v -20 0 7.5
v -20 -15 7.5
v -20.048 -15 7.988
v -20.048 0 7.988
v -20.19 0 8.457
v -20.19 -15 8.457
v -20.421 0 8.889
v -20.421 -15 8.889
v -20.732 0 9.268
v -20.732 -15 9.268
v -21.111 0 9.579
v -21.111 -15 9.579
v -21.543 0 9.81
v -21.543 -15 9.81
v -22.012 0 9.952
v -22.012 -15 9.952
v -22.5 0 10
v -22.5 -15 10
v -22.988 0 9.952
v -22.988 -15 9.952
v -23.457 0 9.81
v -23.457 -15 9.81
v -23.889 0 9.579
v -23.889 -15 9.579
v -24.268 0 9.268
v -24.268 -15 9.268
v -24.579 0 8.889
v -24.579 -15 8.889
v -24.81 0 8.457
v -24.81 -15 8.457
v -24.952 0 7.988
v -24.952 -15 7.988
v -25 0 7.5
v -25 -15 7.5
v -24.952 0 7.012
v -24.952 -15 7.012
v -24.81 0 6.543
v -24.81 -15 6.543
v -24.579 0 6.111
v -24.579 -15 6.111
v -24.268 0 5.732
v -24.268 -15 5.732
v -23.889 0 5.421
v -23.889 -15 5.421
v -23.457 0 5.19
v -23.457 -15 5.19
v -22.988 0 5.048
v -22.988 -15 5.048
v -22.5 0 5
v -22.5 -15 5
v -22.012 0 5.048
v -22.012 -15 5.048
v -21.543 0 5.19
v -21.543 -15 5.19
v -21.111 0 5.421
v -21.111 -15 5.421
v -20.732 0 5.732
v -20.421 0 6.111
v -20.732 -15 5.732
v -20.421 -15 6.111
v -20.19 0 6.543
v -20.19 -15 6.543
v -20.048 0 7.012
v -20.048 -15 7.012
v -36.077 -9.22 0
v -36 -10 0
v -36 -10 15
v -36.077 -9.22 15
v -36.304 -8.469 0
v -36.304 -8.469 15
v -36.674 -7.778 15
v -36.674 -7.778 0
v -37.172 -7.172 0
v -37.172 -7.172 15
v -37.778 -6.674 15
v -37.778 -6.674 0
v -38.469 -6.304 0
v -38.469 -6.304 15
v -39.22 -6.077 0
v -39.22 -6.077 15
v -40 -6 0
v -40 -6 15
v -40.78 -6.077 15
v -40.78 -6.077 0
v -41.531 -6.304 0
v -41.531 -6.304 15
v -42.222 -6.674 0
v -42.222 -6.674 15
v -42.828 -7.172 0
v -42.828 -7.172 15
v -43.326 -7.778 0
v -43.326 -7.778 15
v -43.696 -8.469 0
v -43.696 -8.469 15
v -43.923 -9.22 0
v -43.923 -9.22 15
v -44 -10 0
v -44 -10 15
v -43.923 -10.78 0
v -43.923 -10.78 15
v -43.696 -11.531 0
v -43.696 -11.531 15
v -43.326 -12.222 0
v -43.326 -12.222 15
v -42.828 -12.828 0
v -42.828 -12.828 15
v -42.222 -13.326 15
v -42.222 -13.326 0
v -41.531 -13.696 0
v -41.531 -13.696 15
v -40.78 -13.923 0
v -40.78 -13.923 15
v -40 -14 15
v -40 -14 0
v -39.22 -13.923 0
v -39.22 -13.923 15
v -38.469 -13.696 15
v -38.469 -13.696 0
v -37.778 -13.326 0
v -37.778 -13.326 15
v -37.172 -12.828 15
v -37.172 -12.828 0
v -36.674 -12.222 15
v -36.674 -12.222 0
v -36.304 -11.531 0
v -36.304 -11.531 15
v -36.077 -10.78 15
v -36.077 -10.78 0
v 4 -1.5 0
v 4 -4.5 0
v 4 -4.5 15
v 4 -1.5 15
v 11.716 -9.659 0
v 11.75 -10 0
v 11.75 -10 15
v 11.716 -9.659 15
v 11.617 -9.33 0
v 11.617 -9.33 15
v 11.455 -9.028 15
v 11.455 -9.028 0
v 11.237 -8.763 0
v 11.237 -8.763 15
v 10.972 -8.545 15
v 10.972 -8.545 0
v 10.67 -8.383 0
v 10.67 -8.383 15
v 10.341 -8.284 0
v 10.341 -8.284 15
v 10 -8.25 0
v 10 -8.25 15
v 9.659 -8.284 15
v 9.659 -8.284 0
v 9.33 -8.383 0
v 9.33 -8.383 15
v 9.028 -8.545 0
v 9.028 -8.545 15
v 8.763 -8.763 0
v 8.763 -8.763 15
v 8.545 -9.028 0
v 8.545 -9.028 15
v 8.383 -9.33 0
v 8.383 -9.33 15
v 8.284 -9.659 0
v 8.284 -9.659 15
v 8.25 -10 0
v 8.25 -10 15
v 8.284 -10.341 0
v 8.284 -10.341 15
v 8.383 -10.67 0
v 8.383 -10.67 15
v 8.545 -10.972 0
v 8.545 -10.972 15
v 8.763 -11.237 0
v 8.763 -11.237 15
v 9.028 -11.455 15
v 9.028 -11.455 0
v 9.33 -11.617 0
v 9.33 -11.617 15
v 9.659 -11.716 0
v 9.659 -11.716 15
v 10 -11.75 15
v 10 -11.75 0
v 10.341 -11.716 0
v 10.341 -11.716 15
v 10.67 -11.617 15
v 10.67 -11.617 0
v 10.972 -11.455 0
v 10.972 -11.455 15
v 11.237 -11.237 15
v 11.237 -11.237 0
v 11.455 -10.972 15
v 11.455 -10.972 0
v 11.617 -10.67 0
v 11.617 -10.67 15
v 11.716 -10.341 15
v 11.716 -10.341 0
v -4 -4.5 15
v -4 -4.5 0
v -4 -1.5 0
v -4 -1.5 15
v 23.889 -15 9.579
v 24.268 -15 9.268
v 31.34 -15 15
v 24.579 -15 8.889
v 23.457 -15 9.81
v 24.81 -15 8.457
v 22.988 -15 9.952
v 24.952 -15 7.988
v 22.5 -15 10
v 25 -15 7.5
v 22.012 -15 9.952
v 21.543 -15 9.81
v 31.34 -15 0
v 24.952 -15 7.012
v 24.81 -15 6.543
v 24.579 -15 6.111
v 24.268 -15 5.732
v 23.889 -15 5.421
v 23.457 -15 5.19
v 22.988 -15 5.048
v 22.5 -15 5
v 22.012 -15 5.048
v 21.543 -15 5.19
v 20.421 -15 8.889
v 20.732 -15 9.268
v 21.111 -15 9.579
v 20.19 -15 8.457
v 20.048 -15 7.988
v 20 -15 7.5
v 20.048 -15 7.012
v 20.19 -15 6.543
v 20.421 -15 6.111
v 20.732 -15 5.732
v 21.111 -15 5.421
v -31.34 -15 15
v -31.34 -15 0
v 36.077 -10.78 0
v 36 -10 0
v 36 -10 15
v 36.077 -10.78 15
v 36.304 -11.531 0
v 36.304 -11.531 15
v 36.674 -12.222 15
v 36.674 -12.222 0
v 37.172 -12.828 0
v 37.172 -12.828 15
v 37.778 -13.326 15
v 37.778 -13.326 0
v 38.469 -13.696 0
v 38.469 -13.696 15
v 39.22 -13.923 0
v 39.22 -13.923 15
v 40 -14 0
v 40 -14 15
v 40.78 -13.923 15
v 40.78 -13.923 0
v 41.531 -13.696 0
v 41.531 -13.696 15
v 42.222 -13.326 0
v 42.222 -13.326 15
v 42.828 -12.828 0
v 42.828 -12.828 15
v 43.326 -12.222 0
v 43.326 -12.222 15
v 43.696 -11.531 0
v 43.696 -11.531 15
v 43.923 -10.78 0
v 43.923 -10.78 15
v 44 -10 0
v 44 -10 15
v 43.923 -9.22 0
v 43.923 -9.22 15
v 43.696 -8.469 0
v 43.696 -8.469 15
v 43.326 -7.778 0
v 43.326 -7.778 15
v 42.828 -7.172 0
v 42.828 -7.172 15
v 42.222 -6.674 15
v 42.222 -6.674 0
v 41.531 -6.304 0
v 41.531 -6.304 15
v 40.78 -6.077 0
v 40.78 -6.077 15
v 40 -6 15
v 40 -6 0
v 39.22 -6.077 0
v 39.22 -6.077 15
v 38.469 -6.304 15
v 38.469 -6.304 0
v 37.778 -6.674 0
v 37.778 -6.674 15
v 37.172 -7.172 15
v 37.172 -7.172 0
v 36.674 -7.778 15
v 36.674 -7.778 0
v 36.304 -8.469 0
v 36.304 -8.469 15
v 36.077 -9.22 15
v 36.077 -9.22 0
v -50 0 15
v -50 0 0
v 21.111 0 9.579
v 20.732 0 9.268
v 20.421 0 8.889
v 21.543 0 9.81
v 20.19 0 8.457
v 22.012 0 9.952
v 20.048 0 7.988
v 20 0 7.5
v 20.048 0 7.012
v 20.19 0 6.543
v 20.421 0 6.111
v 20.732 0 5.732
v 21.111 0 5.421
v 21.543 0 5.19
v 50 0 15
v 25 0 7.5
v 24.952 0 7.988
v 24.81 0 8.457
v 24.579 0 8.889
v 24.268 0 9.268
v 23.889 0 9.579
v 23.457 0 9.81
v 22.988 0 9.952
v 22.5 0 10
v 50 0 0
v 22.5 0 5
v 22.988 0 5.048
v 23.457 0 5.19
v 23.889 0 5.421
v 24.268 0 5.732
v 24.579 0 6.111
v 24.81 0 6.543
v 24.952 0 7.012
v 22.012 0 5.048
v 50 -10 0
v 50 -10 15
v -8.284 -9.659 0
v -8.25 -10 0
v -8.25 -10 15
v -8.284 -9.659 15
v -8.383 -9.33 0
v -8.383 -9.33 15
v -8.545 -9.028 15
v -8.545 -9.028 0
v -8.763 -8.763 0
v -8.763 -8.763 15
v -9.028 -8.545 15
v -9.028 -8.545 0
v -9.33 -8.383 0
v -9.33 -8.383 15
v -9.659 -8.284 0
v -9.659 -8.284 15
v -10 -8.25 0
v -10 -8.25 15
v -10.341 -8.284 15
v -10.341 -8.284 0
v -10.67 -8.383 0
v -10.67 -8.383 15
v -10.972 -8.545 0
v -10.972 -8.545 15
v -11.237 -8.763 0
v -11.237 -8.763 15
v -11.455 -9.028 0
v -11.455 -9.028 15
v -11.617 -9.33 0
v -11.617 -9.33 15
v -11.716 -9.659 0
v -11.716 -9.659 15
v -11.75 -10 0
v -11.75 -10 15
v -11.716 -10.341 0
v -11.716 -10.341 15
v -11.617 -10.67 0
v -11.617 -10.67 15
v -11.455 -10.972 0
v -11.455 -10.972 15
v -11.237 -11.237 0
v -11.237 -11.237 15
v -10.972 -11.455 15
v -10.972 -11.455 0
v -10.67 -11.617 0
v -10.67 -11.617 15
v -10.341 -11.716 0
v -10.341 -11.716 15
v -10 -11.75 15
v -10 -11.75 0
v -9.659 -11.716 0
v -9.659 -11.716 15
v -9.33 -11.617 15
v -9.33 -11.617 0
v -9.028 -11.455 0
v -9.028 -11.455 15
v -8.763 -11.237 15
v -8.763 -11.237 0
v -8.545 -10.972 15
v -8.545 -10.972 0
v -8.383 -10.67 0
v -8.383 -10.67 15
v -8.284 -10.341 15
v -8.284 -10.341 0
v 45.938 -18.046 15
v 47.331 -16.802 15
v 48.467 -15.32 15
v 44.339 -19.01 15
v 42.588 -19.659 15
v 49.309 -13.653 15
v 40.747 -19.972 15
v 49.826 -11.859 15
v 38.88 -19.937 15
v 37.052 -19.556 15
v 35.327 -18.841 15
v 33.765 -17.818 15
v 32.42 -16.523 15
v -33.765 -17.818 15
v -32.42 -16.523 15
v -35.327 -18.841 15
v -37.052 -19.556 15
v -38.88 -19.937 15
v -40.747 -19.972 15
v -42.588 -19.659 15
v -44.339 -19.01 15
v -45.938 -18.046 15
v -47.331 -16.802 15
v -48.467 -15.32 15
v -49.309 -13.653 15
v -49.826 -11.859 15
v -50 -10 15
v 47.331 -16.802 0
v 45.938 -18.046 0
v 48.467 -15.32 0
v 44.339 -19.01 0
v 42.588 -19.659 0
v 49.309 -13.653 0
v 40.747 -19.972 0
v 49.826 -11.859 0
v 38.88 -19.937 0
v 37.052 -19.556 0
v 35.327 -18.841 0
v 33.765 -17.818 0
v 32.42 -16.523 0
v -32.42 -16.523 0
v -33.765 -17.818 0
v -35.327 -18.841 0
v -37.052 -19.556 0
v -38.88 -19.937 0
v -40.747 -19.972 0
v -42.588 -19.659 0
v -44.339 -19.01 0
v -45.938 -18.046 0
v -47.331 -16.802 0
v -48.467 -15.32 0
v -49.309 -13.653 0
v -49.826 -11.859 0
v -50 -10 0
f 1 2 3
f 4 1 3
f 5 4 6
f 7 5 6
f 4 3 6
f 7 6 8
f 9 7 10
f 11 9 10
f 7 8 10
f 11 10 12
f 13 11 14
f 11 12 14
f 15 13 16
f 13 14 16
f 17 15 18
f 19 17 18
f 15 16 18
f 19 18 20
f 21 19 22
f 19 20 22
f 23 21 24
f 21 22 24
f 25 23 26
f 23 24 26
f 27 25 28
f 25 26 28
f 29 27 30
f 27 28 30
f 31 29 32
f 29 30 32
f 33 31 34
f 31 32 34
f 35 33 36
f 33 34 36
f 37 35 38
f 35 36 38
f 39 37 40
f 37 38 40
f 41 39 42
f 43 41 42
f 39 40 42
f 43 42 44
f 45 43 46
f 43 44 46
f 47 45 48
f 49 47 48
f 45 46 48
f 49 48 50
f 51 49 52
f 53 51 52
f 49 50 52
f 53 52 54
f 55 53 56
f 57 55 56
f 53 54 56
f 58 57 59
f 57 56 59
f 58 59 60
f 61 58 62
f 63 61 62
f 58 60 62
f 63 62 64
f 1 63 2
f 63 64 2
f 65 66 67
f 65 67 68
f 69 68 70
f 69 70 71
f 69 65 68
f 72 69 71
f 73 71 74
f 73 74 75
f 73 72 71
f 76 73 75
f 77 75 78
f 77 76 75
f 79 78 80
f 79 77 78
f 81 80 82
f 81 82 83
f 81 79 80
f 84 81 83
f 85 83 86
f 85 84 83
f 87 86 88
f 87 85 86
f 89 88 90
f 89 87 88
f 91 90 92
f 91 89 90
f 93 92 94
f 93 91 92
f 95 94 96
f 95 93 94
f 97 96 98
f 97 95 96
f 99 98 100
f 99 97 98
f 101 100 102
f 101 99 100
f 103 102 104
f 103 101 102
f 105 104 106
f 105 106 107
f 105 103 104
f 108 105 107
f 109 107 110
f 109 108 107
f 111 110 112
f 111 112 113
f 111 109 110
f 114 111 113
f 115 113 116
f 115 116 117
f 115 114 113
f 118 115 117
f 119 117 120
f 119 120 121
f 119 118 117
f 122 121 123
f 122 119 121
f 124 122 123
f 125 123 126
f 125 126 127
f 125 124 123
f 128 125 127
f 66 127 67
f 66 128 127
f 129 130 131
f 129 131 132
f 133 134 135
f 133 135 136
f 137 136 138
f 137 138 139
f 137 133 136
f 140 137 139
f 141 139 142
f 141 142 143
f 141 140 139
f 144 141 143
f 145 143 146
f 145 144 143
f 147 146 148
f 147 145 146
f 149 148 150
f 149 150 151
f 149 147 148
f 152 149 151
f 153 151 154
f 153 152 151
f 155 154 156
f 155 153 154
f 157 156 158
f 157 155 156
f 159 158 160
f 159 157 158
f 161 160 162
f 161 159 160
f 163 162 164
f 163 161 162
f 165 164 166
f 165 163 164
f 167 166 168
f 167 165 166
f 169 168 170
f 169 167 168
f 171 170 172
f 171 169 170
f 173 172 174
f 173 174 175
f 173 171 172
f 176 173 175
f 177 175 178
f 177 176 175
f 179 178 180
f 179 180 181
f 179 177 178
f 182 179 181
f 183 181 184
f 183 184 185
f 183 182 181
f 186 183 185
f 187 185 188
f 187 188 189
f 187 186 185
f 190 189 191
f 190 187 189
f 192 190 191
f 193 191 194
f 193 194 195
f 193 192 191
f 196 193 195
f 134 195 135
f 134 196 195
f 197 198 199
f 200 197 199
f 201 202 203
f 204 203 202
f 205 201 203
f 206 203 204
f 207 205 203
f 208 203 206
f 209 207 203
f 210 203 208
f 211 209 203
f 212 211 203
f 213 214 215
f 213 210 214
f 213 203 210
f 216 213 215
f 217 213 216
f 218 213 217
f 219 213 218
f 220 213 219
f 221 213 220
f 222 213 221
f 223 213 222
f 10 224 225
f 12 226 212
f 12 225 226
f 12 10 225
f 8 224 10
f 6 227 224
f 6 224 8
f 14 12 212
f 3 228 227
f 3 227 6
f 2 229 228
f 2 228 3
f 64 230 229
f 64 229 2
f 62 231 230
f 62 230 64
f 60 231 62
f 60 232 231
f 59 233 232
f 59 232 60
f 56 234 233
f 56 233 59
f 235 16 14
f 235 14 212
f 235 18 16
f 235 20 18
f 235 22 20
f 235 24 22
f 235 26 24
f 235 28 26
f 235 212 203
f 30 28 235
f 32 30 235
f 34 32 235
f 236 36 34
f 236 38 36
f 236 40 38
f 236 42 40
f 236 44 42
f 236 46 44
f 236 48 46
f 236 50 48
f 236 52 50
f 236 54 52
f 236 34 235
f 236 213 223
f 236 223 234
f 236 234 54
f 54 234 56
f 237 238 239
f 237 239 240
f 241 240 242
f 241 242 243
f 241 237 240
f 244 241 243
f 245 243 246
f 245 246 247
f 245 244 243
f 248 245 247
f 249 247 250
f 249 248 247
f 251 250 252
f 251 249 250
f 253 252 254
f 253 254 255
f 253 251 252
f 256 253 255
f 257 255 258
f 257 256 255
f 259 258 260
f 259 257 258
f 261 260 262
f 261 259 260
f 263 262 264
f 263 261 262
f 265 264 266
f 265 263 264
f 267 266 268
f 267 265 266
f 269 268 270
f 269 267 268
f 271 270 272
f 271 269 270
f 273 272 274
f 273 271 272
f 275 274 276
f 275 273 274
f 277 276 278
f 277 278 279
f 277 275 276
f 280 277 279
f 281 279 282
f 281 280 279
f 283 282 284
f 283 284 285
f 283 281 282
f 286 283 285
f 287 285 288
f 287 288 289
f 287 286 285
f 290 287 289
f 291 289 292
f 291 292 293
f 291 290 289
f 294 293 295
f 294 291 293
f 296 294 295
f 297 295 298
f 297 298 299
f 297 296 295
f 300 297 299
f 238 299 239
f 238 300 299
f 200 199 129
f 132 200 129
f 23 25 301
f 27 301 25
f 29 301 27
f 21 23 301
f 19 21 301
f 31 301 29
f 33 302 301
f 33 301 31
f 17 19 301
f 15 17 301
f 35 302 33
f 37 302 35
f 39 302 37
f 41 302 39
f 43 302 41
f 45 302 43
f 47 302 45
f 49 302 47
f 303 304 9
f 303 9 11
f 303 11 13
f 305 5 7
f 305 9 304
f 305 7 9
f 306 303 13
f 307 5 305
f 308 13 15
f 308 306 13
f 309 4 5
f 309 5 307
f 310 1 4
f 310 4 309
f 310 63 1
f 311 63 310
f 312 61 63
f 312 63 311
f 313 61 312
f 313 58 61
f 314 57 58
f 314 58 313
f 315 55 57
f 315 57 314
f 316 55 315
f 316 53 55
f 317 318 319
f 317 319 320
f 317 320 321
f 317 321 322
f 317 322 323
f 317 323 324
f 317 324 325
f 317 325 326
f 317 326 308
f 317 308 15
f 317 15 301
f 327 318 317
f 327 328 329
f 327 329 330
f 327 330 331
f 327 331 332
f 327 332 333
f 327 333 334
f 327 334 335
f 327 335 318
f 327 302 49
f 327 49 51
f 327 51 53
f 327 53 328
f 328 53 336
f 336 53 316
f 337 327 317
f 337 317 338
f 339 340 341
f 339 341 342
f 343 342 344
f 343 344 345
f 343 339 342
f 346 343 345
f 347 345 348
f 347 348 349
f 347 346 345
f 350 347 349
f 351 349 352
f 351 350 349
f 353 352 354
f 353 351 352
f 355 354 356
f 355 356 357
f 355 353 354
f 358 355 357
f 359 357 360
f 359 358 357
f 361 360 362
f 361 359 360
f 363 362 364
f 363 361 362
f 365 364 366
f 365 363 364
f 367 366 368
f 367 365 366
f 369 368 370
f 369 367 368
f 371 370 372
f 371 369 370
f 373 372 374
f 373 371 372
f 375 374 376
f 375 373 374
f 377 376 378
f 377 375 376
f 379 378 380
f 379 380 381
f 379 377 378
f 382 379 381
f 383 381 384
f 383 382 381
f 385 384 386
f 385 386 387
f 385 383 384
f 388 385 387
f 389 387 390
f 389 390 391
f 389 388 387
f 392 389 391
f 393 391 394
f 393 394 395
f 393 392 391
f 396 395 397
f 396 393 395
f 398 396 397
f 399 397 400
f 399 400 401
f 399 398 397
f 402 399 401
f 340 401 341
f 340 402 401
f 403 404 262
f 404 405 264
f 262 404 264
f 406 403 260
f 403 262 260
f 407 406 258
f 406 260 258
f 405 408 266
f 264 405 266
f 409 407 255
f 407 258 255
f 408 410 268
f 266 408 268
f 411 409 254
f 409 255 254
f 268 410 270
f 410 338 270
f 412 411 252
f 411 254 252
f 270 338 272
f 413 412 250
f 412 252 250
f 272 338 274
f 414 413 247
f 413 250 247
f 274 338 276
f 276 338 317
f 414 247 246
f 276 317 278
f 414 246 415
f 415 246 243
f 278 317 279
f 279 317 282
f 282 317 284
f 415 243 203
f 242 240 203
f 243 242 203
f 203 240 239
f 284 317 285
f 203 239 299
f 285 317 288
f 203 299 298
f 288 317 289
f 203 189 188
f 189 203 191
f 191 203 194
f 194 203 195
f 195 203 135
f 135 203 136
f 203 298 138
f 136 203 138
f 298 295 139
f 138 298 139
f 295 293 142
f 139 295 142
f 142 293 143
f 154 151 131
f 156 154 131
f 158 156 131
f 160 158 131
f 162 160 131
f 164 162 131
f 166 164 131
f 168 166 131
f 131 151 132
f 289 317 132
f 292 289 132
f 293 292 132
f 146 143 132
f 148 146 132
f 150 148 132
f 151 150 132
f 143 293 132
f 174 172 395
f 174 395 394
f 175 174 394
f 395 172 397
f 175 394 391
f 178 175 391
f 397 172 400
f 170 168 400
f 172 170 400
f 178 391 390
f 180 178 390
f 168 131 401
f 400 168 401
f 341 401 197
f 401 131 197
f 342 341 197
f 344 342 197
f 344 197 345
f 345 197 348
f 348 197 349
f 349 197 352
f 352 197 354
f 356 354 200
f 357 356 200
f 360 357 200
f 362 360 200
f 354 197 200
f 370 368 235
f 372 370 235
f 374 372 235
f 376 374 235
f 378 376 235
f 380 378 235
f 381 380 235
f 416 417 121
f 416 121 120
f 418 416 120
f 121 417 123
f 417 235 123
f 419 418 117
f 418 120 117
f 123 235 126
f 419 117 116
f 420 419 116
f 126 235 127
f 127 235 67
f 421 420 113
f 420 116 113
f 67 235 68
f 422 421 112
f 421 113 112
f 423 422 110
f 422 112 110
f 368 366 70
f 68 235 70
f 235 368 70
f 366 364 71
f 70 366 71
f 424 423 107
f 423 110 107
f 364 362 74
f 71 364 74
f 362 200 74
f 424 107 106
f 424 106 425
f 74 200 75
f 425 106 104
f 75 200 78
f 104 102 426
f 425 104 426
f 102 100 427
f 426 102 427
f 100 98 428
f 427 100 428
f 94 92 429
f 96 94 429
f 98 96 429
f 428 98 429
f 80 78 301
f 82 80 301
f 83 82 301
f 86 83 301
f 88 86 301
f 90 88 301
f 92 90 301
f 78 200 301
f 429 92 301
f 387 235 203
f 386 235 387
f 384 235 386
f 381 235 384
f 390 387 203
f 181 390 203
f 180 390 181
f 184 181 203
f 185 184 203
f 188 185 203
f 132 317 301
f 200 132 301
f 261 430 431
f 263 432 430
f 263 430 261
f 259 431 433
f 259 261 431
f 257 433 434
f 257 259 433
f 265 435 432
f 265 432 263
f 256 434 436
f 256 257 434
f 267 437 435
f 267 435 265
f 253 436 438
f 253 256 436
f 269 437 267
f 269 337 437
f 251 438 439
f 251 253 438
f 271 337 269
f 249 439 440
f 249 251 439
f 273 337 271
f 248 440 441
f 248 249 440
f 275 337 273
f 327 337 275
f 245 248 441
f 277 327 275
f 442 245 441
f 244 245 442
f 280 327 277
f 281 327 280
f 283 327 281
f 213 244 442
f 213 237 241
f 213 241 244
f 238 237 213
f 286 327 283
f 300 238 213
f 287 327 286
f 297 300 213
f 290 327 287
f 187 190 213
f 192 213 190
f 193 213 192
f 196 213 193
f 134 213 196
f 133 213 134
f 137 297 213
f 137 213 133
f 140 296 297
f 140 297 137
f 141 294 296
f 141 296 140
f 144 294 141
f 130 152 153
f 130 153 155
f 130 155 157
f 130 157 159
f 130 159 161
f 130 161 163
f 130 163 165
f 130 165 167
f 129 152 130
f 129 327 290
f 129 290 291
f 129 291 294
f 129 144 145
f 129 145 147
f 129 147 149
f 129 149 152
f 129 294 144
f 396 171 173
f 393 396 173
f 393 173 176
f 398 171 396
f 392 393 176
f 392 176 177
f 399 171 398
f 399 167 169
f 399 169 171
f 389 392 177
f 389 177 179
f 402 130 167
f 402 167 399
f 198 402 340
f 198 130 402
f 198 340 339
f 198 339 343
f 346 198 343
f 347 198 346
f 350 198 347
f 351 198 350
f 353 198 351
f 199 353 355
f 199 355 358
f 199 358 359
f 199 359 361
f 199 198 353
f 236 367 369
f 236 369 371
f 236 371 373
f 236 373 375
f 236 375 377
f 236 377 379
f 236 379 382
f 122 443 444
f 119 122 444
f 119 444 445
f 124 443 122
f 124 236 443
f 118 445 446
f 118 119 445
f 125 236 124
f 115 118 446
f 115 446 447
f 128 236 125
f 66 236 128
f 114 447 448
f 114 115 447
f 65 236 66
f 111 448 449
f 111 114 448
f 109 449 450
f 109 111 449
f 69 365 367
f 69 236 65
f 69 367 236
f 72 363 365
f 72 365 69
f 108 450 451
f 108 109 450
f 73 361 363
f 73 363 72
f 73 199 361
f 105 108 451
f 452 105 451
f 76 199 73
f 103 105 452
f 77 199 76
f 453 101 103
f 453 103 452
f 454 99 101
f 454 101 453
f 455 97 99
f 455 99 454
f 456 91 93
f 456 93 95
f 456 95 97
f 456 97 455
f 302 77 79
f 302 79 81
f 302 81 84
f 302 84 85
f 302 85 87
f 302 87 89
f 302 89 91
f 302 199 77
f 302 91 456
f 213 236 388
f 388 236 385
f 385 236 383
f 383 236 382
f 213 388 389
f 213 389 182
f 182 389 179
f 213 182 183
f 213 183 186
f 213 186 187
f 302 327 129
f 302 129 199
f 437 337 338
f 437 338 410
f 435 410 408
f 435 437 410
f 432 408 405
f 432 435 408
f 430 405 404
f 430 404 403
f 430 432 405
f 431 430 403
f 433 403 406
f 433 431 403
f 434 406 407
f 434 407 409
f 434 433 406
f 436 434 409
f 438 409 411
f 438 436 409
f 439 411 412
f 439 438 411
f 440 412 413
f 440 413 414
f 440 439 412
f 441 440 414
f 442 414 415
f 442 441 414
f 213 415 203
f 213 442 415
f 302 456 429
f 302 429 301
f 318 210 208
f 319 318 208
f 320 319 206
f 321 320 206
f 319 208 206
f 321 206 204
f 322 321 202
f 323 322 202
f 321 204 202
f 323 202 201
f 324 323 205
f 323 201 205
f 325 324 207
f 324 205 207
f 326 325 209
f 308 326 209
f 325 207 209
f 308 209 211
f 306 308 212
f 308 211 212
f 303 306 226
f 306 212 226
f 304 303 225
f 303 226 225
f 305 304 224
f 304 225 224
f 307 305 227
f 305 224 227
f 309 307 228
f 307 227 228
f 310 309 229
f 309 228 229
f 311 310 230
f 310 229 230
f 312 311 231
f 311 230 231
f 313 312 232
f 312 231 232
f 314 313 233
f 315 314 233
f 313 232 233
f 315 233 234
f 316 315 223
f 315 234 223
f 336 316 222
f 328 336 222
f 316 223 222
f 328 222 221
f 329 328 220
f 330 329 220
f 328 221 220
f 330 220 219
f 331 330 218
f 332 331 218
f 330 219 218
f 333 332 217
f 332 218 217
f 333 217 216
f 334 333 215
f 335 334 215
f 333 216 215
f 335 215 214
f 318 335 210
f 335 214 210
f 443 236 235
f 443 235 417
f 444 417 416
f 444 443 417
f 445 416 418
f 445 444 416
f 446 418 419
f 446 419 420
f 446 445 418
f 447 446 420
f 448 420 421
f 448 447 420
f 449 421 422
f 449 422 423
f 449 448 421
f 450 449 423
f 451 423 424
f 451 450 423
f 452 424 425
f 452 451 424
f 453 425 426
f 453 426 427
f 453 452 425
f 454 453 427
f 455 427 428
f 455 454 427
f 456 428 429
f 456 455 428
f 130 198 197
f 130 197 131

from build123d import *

# Parameters (mm, degrees)
ESBO_O1_R                = 4
ESBO_O1_R_2              = 1.75
ESBO_O1_W                = 8
ESBO_O1_H                = 3
RESSALTO_EXTRUS_O1_DEPTH = 15
ESBO_O2_R                = 2.5
CORTE_EXTRUS_O1_DEPTH    = 15


with BuildPart() as part:
    # Esboço1 → Ressalto-extrusão1 (new body)
    with BuildSketch(Plane.XY):
        with BuildLine():
            Line((50, 0), (50, -10))
            ThreePointArc((50, -10), (42.588190451, -19.659258263), (31.339745962, -15))
            Line((31.339745962, -15), (-31.339745962, -15))
            ThreePointArc((-31.339745962, -15), (-42.588190451, -19.659258263), (-50, -10))
            Line((-50, -10), (-50, 0))
            Line((-50, 0), (50, 0))
        make_face()
        with Locations((-40, -10)):
            Circle(ESBO_O1_R, mode=Mode.SUBTRACT)
        with Locations(Location((40, -10, 0), (0, 0, 180))):
            Circle(ESBO_O1_R, mode=Mode.SUBTRACT)
        with Locations((10, -10)):
            Circle(ESBO_O1_R_2, mode=Mode.SUBTRACT)
        with Locations((-10, -10)):
            Circle(ESBO_O1_R_2, mode=Mode.SUBTRACT)
        with Locations((0, -3)):
            Rectangle(ESBO_O1_W, ESBO_O1_H, mode=Mode.SUBTRACT)
    extrude(amount=RESSALTO_EXTRUS_O1_DEPTH)

    # Esboço2 → Corte-extrusão1 (cut)
    with BuildSketch(Plane.XZ.offset(15)):
        with Locations((22.5, 7.5)):
            Circle(ESBO_O2_R)
        with Locations((-22.5, 7.5)):
            Circle(ESBO_O2_R)
    extrude(amount=-CORTE_EXTRUS_O1_DEPTH, mode=Mode.SUBTRACT)


solid = part.part
